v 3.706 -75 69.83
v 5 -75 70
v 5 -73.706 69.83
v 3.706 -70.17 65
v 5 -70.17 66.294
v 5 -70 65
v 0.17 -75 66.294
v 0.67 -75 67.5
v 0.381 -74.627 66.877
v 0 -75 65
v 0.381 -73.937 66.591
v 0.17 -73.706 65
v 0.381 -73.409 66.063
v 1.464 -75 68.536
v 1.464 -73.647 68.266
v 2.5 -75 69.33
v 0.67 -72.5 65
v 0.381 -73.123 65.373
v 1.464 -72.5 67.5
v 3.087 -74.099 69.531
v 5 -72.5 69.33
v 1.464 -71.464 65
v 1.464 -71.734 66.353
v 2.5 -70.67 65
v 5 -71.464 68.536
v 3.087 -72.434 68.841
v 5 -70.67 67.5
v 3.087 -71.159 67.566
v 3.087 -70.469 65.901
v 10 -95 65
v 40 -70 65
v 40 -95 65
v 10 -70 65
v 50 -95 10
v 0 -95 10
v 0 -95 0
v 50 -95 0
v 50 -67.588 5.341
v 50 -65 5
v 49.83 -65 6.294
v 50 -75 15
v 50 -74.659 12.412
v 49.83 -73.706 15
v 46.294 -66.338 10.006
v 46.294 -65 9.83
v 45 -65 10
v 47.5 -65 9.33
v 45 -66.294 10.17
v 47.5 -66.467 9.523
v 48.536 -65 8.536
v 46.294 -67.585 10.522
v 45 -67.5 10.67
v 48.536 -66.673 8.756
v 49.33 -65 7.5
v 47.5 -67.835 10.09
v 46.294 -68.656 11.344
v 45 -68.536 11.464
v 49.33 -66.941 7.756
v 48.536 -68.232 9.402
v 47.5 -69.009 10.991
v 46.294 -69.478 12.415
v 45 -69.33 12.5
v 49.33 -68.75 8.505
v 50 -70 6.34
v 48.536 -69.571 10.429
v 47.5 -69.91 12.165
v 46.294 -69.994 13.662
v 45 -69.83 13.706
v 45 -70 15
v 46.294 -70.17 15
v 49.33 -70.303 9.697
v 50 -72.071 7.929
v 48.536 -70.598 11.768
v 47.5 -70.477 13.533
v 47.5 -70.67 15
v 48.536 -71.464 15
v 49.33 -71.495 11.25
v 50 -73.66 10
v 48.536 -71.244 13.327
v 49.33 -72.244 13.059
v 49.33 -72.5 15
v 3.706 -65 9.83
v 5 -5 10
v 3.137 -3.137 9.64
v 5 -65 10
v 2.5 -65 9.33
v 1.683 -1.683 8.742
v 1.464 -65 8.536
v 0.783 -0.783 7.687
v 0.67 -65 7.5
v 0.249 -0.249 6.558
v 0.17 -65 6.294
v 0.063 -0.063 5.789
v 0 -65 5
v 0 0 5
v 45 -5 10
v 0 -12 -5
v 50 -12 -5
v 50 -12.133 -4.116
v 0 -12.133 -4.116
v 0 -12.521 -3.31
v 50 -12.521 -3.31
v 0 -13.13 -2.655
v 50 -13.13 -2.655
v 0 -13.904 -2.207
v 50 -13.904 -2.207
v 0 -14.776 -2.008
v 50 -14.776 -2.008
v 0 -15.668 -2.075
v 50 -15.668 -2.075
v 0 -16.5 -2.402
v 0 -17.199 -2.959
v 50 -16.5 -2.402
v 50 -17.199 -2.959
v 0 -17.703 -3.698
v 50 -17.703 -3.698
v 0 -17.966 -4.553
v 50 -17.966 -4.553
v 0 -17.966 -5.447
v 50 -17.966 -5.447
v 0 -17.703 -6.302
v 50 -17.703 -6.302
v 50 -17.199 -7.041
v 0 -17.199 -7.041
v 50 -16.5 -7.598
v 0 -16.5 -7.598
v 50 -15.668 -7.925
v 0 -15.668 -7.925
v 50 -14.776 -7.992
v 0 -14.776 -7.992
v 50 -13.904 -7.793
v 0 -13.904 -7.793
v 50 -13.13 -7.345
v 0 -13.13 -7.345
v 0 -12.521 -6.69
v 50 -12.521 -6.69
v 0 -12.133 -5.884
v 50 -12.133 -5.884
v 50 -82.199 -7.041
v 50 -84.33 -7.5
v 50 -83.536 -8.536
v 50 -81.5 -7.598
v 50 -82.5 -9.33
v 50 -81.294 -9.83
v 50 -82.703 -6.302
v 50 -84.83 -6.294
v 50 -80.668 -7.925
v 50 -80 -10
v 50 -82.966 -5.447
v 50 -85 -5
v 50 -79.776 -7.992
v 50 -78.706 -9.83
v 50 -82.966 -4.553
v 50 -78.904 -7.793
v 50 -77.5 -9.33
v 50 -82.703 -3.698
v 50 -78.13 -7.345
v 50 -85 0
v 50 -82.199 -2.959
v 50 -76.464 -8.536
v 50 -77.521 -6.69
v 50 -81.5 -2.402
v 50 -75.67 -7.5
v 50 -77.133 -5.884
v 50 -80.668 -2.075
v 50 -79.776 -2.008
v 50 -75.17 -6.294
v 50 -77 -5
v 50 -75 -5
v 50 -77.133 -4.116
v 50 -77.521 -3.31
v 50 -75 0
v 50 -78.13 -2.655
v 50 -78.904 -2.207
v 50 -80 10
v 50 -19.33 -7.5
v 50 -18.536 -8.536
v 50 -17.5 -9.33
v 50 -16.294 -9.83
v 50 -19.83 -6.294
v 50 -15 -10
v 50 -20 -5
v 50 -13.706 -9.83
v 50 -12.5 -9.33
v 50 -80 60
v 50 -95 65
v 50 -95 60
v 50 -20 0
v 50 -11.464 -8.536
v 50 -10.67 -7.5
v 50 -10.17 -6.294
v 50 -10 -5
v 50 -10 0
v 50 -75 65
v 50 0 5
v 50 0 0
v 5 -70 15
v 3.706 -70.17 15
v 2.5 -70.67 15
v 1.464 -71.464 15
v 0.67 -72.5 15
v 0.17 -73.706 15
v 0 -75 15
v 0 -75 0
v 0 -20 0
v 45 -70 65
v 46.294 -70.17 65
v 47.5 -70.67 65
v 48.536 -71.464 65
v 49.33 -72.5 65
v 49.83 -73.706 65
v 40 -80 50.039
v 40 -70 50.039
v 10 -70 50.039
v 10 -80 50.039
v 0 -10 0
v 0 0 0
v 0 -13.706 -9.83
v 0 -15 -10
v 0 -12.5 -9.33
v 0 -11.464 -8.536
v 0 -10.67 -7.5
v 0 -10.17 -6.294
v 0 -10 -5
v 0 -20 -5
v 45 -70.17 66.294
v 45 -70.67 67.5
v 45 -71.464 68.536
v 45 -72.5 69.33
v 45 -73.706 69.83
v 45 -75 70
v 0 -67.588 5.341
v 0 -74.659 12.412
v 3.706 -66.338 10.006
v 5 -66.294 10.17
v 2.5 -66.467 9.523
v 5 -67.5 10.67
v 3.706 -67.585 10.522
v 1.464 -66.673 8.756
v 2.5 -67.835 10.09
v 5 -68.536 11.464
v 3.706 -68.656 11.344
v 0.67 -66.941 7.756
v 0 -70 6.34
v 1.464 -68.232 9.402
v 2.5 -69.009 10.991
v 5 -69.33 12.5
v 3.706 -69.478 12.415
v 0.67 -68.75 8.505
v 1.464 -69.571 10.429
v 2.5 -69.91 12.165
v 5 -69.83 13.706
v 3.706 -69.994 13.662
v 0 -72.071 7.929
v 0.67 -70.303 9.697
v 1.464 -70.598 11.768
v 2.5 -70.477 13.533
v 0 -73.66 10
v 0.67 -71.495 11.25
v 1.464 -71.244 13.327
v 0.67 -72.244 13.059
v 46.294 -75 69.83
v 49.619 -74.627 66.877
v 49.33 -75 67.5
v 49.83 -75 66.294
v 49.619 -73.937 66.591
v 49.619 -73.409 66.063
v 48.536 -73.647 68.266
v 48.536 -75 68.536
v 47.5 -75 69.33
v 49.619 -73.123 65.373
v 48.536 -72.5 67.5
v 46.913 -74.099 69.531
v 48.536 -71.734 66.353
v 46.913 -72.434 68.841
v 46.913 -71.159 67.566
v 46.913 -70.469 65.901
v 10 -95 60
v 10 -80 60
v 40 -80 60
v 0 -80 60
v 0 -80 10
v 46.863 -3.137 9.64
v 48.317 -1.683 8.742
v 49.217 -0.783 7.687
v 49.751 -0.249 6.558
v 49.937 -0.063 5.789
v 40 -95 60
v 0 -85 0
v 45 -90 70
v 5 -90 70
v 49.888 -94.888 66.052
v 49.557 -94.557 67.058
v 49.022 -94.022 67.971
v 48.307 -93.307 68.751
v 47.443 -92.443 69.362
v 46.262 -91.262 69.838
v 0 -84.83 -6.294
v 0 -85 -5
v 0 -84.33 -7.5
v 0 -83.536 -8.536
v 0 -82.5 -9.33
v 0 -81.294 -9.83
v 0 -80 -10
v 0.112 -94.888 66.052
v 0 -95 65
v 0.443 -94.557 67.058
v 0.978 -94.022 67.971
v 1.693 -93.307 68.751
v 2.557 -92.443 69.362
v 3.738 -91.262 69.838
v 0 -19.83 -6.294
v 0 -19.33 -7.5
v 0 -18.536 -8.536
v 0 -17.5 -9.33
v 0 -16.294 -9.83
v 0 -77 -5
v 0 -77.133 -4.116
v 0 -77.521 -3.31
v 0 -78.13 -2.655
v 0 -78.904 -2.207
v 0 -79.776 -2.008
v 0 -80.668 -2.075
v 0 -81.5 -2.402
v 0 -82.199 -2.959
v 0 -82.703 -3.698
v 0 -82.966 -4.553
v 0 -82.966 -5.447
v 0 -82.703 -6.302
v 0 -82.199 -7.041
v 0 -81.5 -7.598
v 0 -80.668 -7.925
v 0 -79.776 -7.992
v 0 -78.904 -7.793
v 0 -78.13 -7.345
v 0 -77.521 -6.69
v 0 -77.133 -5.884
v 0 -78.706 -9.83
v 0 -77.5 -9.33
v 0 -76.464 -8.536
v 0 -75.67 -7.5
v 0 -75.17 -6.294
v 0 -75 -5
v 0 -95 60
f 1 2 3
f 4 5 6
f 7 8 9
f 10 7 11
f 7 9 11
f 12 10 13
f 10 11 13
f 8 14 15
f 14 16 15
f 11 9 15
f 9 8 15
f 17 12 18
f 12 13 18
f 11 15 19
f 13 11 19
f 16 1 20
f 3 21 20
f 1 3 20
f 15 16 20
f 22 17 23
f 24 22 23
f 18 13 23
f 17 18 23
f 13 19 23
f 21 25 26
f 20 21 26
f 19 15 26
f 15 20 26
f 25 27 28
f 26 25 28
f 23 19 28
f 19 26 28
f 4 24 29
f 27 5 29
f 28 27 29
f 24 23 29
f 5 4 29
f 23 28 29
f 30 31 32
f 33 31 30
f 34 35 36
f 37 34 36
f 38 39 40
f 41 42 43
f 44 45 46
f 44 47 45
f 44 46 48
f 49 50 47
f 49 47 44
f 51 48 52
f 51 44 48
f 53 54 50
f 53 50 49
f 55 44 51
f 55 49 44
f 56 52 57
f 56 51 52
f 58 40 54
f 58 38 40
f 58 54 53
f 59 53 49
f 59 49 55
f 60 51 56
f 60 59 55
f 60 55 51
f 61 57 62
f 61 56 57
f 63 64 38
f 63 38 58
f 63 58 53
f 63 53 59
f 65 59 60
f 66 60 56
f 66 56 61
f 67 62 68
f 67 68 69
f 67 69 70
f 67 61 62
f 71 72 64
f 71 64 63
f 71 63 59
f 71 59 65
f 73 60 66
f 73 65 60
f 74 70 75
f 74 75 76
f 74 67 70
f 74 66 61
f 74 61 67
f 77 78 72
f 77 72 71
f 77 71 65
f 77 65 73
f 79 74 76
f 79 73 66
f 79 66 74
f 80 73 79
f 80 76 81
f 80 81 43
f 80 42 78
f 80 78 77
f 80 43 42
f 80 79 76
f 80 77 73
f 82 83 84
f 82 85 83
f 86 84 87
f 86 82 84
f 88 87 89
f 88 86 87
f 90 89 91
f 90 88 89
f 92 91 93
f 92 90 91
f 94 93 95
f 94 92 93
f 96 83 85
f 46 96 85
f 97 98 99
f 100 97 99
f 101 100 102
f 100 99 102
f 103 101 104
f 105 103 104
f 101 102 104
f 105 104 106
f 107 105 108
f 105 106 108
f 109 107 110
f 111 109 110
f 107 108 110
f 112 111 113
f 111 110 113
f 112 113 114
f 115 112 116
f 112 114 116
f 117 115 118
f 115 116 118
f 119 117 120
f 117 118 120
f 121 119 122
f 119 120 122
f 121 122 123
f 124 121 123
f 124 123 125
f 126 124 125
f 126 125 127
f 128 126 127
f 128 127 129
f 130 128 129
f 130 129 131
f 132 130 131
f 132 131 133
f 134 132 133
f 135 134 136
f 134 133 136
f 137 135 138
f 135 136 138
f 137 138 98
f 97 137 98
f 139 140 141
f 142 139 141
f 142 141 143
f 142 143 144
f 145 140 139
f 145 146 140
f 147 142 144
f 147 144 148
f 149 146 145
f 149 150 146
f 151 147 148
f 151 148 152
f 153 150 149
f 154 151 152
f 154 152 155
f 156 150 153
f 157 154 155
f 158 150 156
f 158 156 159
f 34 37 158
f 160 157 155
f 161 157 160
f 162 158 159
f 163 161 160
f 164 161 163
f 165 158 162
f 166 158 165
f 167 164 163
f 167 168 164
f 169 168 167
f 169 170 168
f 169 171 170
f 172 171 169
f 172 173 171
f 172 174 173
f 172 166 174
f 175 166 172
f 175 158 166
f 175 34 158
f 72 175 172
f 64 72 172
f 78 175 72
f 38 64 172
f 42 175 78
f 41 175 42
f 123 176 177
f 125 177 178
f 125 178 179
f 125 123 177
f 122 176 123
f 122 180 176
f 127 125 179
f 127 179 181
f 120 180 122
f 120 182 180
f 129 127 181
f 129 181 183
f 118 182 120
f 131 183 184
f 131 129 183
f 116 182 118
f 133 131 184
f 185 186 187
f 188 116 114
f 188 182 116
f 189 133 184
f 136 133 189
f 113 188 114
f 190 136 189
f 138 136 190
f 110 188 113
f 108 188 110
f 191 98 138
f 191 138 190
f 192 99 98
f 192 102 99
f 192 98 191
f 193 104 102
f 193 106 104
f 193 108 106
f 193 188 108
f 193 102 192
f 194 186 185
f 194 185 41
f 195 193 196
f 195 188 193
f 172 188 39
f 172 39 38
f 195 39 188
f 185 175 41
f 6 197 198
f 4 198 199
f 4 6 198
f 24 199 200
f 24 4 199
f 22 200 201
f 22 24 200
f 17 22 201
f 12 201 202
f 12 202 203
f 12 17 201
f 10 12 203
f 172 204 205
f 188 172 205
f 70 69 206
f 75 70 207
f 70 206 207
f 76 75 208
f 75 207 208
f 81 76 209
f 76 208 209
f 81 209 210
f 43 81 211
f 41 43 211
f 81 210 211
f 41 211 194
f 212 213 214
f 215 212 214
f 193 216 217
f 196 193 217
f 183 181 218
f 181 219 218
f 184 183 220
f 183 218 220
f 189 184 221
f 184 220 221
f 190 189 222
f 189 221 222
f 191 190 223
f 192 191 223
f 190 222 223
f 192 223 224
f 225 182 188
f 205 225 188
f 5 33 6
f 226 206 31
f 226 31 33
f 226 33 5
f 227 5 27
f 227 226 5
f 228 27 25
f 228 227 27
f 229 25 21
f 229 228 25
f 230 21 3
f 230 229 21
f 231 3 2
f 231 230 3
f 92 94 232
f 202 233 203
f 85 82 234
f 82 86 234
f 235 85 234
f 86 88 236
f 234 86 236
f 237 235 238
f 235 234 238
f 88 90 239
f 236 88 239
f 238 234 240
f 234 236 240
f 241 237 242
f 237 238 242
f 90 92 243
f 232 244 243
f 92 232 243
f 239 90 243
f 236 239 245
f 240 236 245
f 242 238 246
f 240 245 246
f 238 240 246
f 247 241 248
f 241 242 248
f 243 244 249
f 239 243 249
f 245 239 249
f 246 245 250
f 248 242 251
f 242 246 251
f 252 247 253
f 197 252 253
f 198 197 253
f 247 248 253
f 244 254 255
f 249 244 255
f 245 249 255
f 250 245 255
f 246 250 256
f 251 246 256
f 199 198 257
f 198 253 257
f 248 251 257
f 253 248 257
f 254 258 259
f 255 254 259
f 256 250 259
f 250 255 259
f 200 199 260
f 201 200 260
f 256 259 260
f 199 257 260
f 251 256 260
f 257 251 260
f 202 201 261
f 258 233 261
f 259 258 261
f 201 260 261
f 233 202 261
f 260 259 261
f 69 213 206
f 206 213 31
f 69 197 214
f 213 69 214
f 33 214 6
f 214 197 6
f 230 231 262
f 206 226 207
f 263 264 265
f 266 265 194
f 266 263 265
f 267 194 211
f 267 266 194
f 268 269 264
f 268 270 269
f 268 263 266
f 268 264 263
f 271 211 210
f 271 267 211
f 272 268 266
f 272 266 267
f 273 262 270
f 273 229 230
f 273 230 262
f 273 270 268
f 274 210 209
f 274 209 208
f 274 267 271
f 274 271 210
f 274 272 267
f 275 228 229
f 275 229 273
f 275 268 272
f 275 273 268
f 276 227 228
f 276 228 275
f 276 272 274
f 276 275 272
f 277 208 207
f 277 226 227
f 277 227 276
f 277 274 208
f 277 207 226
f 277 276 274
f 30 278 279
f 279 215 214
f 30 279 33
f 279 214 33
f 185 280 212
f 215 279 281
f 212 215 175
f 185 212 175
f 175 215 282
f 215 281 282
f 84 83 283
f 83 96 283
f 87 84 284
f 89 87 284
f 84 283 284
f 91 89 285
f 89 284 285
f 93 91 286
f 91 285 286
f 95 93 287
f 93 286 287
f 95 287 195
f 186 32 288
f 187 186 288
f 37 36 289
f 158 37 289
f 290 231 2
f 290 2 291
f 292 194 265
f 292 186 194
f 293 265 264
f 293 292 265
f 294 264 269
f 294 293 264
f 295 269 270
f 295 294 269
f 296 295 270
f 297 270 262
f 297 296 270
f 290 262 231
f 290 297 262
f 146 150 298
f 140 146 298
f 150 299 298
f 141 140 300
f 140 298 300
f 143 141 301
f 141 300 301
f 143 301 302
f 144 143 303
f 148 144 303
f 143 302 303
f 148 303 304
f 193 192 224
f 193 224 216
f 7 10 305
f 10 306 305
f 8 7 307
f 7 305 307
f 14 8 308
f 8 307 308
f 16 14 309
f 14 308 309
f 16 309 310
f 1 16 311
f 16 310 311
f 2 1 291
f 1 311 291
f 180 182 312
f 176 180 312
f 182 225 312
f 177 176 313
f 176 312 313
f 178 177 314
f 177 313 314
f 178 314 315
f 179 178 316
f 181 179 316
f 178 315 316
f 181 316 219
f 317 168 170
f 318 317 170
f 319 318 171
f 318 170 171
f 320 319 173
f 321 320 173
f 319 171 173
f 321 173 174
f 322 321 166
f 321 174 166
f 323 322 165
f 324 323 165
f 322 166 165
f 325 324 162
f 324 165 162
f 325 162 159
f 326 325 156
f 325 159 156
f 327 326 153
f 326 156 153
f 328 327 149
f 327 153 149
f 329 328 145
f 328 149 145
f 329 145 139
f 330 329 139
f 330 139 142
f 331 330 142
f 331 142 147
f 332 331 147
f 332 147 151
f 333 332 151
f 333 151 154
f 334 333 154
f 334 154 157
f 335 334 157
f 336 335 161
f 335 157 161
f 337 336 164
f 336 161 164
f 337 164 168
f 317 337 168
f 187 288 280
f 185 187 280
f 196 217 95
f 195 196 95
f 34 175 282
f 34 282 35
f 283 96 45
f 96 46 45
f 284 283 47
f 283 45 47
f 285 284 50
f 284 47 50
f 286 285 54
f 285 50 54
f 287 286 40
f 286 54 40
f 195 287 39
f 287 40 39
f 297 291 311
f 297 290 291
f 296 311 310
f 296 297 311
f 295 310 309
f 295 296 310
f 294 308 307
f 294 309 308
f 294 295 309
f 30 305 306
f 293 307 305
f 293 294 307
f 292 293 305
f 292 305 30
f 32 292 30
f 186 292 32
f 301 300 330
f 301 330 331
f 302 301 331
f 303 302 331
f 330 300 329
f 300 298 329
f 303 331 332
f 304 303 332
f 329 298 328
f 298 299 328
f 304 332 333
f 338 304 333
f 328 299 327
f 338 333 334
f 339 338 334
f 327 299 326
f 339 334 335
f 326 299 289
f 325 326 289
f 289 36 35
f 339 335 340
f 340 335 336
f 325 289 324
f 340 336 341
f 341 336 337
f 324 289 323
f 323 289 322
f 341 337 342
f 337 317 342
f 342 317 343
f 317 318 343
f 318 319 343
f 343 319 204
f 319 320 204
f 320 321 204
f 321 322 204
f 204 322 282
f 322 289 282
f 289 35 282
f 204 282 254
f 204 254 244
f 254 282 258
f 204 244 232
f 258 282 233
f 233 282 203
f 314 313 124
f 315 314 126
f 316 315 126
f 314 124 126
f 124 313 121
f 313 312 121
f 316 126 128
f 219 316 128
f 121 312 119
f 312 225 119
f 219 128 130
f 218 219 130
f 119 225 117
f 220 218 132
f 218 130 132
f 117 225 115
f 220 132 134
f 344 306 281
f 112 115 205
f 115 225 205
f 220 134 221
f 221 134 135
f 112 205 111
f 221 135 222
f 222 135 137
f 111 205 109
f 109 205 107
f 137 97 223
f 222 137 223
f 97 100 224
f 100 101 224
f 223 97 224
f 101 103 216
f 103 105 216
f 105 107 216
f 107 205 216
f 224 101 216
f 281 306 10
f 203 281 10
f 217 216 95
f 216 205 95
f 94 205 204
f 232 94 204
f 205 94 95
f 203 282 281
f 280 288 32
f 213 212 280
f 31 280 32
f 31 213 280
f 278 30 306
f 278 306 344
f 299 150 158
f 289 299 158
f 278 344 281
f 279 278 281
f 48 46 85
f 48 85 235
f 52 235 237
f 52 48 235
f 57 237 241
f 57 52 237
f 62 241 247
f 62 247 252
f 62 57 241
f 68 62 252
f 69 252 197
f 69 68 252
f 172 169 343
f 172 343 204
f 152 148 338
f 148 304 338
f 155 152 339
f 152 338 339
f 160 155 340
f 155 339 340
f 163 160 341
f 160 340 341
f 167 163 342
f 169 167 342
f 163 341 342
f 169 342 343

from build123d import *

# Parameters (mm, degrees)
F1_DEPTH = 50
F2_F1_R  = 5
F2_F2_R  = 5
F3_W     = 10
F3_H     = 10
F3_R     = 3
F4_DEPTH = 50
F5_R     = 4.99999
F6_W     = 30
F6_H     = 14.961473023
F7_DEPTH = 25


# Not quite as in the source:
# - a fillet or chamfer is up to 0.001 mm smaller than in the source, because OpenCascade refuses the exact size


with BuildPart() as f1:
    # F0 (on Right) → F1 (new body)
    with BuildSketch(Plane.YZ):
        Polygon((-95, 0), (0, 0), (0, 10), (-70, 10), (-70, 70), (-82.7777751063, 70), (-95, 70), (-95, 60), (-80, 60), (-80, 10), (-95, 10), align=None)
    extrude(amount=F1_DEPTH)

    # F2: fillet of radius 5 on 8 edges, made by hand

    # F2_f1
    f2_f1_edges = [f1.edges().sort_by_distance(p)[0] for p in [
        (25, -70, 10),
    ]]
    fillet(f2_f1_edges, radius=F2_F1_R)

    # F2_f2
    f2_f2_edges = [f1.edges().sort_by_distance(p)[0] for p in [
        (25, -70, 70),
        (50, -82.5, 70),
        (0, -82.5, 70),
        (25, 0, 10),
        (50, -32.5, 10),
        (0, -32.5, 10),
        (25, -95, 70),
        (0, -68.5355339059, 11.4644660941),
        (50, -68.5355339059, 11.4644660941),
    ]]
    fillet(f2_f2_edges, radius=F2_F2_R)

    # F3 (on face) → F4 (join)
    with BuildSketch(Plane.YZ.offset(50)):
        with Locations((-80, -5)):
            Rectangle(F3_W, F3_H)
        with Locations((-80, -5)):
            Circle(F3_R, mode=Mode.SUBTRACT)
        with Locations((-15, -5)):
            Rectangle(F3_W, F3_H)
        with Locations((-15, -5)):
            Circle(F3_R, mode=Mode.SUBTRACT)
    extrude(amount=-F4_DEPTH)

    # F5 (radius 5 in the source; OpenCascade refuses exactly that, so slightly less here)
    f5_edges = [f1.edges().sort_by_distance(p)[0] for p in [
        (25, -75, -10),
        (25, -85, -10),
        (25, -20, -10),
        (25, -10, -10),
    ]]
    fillet(f5_edges, radius=F5_R)

    # F6 (on face) → F7 (cut)
    with BuildSketch(Plane(origin=(0, -70, 0), x_dir=(-1, 0, 0), z_dir=(0, 1, 0))):
        with Locations((-25, 57.5192634885)):
            Rectangle(F6_W, F6_H)
    extrude(amount=-F7_DEPTH, mode=Mode.SUBTRACT)


solid = f1.part
